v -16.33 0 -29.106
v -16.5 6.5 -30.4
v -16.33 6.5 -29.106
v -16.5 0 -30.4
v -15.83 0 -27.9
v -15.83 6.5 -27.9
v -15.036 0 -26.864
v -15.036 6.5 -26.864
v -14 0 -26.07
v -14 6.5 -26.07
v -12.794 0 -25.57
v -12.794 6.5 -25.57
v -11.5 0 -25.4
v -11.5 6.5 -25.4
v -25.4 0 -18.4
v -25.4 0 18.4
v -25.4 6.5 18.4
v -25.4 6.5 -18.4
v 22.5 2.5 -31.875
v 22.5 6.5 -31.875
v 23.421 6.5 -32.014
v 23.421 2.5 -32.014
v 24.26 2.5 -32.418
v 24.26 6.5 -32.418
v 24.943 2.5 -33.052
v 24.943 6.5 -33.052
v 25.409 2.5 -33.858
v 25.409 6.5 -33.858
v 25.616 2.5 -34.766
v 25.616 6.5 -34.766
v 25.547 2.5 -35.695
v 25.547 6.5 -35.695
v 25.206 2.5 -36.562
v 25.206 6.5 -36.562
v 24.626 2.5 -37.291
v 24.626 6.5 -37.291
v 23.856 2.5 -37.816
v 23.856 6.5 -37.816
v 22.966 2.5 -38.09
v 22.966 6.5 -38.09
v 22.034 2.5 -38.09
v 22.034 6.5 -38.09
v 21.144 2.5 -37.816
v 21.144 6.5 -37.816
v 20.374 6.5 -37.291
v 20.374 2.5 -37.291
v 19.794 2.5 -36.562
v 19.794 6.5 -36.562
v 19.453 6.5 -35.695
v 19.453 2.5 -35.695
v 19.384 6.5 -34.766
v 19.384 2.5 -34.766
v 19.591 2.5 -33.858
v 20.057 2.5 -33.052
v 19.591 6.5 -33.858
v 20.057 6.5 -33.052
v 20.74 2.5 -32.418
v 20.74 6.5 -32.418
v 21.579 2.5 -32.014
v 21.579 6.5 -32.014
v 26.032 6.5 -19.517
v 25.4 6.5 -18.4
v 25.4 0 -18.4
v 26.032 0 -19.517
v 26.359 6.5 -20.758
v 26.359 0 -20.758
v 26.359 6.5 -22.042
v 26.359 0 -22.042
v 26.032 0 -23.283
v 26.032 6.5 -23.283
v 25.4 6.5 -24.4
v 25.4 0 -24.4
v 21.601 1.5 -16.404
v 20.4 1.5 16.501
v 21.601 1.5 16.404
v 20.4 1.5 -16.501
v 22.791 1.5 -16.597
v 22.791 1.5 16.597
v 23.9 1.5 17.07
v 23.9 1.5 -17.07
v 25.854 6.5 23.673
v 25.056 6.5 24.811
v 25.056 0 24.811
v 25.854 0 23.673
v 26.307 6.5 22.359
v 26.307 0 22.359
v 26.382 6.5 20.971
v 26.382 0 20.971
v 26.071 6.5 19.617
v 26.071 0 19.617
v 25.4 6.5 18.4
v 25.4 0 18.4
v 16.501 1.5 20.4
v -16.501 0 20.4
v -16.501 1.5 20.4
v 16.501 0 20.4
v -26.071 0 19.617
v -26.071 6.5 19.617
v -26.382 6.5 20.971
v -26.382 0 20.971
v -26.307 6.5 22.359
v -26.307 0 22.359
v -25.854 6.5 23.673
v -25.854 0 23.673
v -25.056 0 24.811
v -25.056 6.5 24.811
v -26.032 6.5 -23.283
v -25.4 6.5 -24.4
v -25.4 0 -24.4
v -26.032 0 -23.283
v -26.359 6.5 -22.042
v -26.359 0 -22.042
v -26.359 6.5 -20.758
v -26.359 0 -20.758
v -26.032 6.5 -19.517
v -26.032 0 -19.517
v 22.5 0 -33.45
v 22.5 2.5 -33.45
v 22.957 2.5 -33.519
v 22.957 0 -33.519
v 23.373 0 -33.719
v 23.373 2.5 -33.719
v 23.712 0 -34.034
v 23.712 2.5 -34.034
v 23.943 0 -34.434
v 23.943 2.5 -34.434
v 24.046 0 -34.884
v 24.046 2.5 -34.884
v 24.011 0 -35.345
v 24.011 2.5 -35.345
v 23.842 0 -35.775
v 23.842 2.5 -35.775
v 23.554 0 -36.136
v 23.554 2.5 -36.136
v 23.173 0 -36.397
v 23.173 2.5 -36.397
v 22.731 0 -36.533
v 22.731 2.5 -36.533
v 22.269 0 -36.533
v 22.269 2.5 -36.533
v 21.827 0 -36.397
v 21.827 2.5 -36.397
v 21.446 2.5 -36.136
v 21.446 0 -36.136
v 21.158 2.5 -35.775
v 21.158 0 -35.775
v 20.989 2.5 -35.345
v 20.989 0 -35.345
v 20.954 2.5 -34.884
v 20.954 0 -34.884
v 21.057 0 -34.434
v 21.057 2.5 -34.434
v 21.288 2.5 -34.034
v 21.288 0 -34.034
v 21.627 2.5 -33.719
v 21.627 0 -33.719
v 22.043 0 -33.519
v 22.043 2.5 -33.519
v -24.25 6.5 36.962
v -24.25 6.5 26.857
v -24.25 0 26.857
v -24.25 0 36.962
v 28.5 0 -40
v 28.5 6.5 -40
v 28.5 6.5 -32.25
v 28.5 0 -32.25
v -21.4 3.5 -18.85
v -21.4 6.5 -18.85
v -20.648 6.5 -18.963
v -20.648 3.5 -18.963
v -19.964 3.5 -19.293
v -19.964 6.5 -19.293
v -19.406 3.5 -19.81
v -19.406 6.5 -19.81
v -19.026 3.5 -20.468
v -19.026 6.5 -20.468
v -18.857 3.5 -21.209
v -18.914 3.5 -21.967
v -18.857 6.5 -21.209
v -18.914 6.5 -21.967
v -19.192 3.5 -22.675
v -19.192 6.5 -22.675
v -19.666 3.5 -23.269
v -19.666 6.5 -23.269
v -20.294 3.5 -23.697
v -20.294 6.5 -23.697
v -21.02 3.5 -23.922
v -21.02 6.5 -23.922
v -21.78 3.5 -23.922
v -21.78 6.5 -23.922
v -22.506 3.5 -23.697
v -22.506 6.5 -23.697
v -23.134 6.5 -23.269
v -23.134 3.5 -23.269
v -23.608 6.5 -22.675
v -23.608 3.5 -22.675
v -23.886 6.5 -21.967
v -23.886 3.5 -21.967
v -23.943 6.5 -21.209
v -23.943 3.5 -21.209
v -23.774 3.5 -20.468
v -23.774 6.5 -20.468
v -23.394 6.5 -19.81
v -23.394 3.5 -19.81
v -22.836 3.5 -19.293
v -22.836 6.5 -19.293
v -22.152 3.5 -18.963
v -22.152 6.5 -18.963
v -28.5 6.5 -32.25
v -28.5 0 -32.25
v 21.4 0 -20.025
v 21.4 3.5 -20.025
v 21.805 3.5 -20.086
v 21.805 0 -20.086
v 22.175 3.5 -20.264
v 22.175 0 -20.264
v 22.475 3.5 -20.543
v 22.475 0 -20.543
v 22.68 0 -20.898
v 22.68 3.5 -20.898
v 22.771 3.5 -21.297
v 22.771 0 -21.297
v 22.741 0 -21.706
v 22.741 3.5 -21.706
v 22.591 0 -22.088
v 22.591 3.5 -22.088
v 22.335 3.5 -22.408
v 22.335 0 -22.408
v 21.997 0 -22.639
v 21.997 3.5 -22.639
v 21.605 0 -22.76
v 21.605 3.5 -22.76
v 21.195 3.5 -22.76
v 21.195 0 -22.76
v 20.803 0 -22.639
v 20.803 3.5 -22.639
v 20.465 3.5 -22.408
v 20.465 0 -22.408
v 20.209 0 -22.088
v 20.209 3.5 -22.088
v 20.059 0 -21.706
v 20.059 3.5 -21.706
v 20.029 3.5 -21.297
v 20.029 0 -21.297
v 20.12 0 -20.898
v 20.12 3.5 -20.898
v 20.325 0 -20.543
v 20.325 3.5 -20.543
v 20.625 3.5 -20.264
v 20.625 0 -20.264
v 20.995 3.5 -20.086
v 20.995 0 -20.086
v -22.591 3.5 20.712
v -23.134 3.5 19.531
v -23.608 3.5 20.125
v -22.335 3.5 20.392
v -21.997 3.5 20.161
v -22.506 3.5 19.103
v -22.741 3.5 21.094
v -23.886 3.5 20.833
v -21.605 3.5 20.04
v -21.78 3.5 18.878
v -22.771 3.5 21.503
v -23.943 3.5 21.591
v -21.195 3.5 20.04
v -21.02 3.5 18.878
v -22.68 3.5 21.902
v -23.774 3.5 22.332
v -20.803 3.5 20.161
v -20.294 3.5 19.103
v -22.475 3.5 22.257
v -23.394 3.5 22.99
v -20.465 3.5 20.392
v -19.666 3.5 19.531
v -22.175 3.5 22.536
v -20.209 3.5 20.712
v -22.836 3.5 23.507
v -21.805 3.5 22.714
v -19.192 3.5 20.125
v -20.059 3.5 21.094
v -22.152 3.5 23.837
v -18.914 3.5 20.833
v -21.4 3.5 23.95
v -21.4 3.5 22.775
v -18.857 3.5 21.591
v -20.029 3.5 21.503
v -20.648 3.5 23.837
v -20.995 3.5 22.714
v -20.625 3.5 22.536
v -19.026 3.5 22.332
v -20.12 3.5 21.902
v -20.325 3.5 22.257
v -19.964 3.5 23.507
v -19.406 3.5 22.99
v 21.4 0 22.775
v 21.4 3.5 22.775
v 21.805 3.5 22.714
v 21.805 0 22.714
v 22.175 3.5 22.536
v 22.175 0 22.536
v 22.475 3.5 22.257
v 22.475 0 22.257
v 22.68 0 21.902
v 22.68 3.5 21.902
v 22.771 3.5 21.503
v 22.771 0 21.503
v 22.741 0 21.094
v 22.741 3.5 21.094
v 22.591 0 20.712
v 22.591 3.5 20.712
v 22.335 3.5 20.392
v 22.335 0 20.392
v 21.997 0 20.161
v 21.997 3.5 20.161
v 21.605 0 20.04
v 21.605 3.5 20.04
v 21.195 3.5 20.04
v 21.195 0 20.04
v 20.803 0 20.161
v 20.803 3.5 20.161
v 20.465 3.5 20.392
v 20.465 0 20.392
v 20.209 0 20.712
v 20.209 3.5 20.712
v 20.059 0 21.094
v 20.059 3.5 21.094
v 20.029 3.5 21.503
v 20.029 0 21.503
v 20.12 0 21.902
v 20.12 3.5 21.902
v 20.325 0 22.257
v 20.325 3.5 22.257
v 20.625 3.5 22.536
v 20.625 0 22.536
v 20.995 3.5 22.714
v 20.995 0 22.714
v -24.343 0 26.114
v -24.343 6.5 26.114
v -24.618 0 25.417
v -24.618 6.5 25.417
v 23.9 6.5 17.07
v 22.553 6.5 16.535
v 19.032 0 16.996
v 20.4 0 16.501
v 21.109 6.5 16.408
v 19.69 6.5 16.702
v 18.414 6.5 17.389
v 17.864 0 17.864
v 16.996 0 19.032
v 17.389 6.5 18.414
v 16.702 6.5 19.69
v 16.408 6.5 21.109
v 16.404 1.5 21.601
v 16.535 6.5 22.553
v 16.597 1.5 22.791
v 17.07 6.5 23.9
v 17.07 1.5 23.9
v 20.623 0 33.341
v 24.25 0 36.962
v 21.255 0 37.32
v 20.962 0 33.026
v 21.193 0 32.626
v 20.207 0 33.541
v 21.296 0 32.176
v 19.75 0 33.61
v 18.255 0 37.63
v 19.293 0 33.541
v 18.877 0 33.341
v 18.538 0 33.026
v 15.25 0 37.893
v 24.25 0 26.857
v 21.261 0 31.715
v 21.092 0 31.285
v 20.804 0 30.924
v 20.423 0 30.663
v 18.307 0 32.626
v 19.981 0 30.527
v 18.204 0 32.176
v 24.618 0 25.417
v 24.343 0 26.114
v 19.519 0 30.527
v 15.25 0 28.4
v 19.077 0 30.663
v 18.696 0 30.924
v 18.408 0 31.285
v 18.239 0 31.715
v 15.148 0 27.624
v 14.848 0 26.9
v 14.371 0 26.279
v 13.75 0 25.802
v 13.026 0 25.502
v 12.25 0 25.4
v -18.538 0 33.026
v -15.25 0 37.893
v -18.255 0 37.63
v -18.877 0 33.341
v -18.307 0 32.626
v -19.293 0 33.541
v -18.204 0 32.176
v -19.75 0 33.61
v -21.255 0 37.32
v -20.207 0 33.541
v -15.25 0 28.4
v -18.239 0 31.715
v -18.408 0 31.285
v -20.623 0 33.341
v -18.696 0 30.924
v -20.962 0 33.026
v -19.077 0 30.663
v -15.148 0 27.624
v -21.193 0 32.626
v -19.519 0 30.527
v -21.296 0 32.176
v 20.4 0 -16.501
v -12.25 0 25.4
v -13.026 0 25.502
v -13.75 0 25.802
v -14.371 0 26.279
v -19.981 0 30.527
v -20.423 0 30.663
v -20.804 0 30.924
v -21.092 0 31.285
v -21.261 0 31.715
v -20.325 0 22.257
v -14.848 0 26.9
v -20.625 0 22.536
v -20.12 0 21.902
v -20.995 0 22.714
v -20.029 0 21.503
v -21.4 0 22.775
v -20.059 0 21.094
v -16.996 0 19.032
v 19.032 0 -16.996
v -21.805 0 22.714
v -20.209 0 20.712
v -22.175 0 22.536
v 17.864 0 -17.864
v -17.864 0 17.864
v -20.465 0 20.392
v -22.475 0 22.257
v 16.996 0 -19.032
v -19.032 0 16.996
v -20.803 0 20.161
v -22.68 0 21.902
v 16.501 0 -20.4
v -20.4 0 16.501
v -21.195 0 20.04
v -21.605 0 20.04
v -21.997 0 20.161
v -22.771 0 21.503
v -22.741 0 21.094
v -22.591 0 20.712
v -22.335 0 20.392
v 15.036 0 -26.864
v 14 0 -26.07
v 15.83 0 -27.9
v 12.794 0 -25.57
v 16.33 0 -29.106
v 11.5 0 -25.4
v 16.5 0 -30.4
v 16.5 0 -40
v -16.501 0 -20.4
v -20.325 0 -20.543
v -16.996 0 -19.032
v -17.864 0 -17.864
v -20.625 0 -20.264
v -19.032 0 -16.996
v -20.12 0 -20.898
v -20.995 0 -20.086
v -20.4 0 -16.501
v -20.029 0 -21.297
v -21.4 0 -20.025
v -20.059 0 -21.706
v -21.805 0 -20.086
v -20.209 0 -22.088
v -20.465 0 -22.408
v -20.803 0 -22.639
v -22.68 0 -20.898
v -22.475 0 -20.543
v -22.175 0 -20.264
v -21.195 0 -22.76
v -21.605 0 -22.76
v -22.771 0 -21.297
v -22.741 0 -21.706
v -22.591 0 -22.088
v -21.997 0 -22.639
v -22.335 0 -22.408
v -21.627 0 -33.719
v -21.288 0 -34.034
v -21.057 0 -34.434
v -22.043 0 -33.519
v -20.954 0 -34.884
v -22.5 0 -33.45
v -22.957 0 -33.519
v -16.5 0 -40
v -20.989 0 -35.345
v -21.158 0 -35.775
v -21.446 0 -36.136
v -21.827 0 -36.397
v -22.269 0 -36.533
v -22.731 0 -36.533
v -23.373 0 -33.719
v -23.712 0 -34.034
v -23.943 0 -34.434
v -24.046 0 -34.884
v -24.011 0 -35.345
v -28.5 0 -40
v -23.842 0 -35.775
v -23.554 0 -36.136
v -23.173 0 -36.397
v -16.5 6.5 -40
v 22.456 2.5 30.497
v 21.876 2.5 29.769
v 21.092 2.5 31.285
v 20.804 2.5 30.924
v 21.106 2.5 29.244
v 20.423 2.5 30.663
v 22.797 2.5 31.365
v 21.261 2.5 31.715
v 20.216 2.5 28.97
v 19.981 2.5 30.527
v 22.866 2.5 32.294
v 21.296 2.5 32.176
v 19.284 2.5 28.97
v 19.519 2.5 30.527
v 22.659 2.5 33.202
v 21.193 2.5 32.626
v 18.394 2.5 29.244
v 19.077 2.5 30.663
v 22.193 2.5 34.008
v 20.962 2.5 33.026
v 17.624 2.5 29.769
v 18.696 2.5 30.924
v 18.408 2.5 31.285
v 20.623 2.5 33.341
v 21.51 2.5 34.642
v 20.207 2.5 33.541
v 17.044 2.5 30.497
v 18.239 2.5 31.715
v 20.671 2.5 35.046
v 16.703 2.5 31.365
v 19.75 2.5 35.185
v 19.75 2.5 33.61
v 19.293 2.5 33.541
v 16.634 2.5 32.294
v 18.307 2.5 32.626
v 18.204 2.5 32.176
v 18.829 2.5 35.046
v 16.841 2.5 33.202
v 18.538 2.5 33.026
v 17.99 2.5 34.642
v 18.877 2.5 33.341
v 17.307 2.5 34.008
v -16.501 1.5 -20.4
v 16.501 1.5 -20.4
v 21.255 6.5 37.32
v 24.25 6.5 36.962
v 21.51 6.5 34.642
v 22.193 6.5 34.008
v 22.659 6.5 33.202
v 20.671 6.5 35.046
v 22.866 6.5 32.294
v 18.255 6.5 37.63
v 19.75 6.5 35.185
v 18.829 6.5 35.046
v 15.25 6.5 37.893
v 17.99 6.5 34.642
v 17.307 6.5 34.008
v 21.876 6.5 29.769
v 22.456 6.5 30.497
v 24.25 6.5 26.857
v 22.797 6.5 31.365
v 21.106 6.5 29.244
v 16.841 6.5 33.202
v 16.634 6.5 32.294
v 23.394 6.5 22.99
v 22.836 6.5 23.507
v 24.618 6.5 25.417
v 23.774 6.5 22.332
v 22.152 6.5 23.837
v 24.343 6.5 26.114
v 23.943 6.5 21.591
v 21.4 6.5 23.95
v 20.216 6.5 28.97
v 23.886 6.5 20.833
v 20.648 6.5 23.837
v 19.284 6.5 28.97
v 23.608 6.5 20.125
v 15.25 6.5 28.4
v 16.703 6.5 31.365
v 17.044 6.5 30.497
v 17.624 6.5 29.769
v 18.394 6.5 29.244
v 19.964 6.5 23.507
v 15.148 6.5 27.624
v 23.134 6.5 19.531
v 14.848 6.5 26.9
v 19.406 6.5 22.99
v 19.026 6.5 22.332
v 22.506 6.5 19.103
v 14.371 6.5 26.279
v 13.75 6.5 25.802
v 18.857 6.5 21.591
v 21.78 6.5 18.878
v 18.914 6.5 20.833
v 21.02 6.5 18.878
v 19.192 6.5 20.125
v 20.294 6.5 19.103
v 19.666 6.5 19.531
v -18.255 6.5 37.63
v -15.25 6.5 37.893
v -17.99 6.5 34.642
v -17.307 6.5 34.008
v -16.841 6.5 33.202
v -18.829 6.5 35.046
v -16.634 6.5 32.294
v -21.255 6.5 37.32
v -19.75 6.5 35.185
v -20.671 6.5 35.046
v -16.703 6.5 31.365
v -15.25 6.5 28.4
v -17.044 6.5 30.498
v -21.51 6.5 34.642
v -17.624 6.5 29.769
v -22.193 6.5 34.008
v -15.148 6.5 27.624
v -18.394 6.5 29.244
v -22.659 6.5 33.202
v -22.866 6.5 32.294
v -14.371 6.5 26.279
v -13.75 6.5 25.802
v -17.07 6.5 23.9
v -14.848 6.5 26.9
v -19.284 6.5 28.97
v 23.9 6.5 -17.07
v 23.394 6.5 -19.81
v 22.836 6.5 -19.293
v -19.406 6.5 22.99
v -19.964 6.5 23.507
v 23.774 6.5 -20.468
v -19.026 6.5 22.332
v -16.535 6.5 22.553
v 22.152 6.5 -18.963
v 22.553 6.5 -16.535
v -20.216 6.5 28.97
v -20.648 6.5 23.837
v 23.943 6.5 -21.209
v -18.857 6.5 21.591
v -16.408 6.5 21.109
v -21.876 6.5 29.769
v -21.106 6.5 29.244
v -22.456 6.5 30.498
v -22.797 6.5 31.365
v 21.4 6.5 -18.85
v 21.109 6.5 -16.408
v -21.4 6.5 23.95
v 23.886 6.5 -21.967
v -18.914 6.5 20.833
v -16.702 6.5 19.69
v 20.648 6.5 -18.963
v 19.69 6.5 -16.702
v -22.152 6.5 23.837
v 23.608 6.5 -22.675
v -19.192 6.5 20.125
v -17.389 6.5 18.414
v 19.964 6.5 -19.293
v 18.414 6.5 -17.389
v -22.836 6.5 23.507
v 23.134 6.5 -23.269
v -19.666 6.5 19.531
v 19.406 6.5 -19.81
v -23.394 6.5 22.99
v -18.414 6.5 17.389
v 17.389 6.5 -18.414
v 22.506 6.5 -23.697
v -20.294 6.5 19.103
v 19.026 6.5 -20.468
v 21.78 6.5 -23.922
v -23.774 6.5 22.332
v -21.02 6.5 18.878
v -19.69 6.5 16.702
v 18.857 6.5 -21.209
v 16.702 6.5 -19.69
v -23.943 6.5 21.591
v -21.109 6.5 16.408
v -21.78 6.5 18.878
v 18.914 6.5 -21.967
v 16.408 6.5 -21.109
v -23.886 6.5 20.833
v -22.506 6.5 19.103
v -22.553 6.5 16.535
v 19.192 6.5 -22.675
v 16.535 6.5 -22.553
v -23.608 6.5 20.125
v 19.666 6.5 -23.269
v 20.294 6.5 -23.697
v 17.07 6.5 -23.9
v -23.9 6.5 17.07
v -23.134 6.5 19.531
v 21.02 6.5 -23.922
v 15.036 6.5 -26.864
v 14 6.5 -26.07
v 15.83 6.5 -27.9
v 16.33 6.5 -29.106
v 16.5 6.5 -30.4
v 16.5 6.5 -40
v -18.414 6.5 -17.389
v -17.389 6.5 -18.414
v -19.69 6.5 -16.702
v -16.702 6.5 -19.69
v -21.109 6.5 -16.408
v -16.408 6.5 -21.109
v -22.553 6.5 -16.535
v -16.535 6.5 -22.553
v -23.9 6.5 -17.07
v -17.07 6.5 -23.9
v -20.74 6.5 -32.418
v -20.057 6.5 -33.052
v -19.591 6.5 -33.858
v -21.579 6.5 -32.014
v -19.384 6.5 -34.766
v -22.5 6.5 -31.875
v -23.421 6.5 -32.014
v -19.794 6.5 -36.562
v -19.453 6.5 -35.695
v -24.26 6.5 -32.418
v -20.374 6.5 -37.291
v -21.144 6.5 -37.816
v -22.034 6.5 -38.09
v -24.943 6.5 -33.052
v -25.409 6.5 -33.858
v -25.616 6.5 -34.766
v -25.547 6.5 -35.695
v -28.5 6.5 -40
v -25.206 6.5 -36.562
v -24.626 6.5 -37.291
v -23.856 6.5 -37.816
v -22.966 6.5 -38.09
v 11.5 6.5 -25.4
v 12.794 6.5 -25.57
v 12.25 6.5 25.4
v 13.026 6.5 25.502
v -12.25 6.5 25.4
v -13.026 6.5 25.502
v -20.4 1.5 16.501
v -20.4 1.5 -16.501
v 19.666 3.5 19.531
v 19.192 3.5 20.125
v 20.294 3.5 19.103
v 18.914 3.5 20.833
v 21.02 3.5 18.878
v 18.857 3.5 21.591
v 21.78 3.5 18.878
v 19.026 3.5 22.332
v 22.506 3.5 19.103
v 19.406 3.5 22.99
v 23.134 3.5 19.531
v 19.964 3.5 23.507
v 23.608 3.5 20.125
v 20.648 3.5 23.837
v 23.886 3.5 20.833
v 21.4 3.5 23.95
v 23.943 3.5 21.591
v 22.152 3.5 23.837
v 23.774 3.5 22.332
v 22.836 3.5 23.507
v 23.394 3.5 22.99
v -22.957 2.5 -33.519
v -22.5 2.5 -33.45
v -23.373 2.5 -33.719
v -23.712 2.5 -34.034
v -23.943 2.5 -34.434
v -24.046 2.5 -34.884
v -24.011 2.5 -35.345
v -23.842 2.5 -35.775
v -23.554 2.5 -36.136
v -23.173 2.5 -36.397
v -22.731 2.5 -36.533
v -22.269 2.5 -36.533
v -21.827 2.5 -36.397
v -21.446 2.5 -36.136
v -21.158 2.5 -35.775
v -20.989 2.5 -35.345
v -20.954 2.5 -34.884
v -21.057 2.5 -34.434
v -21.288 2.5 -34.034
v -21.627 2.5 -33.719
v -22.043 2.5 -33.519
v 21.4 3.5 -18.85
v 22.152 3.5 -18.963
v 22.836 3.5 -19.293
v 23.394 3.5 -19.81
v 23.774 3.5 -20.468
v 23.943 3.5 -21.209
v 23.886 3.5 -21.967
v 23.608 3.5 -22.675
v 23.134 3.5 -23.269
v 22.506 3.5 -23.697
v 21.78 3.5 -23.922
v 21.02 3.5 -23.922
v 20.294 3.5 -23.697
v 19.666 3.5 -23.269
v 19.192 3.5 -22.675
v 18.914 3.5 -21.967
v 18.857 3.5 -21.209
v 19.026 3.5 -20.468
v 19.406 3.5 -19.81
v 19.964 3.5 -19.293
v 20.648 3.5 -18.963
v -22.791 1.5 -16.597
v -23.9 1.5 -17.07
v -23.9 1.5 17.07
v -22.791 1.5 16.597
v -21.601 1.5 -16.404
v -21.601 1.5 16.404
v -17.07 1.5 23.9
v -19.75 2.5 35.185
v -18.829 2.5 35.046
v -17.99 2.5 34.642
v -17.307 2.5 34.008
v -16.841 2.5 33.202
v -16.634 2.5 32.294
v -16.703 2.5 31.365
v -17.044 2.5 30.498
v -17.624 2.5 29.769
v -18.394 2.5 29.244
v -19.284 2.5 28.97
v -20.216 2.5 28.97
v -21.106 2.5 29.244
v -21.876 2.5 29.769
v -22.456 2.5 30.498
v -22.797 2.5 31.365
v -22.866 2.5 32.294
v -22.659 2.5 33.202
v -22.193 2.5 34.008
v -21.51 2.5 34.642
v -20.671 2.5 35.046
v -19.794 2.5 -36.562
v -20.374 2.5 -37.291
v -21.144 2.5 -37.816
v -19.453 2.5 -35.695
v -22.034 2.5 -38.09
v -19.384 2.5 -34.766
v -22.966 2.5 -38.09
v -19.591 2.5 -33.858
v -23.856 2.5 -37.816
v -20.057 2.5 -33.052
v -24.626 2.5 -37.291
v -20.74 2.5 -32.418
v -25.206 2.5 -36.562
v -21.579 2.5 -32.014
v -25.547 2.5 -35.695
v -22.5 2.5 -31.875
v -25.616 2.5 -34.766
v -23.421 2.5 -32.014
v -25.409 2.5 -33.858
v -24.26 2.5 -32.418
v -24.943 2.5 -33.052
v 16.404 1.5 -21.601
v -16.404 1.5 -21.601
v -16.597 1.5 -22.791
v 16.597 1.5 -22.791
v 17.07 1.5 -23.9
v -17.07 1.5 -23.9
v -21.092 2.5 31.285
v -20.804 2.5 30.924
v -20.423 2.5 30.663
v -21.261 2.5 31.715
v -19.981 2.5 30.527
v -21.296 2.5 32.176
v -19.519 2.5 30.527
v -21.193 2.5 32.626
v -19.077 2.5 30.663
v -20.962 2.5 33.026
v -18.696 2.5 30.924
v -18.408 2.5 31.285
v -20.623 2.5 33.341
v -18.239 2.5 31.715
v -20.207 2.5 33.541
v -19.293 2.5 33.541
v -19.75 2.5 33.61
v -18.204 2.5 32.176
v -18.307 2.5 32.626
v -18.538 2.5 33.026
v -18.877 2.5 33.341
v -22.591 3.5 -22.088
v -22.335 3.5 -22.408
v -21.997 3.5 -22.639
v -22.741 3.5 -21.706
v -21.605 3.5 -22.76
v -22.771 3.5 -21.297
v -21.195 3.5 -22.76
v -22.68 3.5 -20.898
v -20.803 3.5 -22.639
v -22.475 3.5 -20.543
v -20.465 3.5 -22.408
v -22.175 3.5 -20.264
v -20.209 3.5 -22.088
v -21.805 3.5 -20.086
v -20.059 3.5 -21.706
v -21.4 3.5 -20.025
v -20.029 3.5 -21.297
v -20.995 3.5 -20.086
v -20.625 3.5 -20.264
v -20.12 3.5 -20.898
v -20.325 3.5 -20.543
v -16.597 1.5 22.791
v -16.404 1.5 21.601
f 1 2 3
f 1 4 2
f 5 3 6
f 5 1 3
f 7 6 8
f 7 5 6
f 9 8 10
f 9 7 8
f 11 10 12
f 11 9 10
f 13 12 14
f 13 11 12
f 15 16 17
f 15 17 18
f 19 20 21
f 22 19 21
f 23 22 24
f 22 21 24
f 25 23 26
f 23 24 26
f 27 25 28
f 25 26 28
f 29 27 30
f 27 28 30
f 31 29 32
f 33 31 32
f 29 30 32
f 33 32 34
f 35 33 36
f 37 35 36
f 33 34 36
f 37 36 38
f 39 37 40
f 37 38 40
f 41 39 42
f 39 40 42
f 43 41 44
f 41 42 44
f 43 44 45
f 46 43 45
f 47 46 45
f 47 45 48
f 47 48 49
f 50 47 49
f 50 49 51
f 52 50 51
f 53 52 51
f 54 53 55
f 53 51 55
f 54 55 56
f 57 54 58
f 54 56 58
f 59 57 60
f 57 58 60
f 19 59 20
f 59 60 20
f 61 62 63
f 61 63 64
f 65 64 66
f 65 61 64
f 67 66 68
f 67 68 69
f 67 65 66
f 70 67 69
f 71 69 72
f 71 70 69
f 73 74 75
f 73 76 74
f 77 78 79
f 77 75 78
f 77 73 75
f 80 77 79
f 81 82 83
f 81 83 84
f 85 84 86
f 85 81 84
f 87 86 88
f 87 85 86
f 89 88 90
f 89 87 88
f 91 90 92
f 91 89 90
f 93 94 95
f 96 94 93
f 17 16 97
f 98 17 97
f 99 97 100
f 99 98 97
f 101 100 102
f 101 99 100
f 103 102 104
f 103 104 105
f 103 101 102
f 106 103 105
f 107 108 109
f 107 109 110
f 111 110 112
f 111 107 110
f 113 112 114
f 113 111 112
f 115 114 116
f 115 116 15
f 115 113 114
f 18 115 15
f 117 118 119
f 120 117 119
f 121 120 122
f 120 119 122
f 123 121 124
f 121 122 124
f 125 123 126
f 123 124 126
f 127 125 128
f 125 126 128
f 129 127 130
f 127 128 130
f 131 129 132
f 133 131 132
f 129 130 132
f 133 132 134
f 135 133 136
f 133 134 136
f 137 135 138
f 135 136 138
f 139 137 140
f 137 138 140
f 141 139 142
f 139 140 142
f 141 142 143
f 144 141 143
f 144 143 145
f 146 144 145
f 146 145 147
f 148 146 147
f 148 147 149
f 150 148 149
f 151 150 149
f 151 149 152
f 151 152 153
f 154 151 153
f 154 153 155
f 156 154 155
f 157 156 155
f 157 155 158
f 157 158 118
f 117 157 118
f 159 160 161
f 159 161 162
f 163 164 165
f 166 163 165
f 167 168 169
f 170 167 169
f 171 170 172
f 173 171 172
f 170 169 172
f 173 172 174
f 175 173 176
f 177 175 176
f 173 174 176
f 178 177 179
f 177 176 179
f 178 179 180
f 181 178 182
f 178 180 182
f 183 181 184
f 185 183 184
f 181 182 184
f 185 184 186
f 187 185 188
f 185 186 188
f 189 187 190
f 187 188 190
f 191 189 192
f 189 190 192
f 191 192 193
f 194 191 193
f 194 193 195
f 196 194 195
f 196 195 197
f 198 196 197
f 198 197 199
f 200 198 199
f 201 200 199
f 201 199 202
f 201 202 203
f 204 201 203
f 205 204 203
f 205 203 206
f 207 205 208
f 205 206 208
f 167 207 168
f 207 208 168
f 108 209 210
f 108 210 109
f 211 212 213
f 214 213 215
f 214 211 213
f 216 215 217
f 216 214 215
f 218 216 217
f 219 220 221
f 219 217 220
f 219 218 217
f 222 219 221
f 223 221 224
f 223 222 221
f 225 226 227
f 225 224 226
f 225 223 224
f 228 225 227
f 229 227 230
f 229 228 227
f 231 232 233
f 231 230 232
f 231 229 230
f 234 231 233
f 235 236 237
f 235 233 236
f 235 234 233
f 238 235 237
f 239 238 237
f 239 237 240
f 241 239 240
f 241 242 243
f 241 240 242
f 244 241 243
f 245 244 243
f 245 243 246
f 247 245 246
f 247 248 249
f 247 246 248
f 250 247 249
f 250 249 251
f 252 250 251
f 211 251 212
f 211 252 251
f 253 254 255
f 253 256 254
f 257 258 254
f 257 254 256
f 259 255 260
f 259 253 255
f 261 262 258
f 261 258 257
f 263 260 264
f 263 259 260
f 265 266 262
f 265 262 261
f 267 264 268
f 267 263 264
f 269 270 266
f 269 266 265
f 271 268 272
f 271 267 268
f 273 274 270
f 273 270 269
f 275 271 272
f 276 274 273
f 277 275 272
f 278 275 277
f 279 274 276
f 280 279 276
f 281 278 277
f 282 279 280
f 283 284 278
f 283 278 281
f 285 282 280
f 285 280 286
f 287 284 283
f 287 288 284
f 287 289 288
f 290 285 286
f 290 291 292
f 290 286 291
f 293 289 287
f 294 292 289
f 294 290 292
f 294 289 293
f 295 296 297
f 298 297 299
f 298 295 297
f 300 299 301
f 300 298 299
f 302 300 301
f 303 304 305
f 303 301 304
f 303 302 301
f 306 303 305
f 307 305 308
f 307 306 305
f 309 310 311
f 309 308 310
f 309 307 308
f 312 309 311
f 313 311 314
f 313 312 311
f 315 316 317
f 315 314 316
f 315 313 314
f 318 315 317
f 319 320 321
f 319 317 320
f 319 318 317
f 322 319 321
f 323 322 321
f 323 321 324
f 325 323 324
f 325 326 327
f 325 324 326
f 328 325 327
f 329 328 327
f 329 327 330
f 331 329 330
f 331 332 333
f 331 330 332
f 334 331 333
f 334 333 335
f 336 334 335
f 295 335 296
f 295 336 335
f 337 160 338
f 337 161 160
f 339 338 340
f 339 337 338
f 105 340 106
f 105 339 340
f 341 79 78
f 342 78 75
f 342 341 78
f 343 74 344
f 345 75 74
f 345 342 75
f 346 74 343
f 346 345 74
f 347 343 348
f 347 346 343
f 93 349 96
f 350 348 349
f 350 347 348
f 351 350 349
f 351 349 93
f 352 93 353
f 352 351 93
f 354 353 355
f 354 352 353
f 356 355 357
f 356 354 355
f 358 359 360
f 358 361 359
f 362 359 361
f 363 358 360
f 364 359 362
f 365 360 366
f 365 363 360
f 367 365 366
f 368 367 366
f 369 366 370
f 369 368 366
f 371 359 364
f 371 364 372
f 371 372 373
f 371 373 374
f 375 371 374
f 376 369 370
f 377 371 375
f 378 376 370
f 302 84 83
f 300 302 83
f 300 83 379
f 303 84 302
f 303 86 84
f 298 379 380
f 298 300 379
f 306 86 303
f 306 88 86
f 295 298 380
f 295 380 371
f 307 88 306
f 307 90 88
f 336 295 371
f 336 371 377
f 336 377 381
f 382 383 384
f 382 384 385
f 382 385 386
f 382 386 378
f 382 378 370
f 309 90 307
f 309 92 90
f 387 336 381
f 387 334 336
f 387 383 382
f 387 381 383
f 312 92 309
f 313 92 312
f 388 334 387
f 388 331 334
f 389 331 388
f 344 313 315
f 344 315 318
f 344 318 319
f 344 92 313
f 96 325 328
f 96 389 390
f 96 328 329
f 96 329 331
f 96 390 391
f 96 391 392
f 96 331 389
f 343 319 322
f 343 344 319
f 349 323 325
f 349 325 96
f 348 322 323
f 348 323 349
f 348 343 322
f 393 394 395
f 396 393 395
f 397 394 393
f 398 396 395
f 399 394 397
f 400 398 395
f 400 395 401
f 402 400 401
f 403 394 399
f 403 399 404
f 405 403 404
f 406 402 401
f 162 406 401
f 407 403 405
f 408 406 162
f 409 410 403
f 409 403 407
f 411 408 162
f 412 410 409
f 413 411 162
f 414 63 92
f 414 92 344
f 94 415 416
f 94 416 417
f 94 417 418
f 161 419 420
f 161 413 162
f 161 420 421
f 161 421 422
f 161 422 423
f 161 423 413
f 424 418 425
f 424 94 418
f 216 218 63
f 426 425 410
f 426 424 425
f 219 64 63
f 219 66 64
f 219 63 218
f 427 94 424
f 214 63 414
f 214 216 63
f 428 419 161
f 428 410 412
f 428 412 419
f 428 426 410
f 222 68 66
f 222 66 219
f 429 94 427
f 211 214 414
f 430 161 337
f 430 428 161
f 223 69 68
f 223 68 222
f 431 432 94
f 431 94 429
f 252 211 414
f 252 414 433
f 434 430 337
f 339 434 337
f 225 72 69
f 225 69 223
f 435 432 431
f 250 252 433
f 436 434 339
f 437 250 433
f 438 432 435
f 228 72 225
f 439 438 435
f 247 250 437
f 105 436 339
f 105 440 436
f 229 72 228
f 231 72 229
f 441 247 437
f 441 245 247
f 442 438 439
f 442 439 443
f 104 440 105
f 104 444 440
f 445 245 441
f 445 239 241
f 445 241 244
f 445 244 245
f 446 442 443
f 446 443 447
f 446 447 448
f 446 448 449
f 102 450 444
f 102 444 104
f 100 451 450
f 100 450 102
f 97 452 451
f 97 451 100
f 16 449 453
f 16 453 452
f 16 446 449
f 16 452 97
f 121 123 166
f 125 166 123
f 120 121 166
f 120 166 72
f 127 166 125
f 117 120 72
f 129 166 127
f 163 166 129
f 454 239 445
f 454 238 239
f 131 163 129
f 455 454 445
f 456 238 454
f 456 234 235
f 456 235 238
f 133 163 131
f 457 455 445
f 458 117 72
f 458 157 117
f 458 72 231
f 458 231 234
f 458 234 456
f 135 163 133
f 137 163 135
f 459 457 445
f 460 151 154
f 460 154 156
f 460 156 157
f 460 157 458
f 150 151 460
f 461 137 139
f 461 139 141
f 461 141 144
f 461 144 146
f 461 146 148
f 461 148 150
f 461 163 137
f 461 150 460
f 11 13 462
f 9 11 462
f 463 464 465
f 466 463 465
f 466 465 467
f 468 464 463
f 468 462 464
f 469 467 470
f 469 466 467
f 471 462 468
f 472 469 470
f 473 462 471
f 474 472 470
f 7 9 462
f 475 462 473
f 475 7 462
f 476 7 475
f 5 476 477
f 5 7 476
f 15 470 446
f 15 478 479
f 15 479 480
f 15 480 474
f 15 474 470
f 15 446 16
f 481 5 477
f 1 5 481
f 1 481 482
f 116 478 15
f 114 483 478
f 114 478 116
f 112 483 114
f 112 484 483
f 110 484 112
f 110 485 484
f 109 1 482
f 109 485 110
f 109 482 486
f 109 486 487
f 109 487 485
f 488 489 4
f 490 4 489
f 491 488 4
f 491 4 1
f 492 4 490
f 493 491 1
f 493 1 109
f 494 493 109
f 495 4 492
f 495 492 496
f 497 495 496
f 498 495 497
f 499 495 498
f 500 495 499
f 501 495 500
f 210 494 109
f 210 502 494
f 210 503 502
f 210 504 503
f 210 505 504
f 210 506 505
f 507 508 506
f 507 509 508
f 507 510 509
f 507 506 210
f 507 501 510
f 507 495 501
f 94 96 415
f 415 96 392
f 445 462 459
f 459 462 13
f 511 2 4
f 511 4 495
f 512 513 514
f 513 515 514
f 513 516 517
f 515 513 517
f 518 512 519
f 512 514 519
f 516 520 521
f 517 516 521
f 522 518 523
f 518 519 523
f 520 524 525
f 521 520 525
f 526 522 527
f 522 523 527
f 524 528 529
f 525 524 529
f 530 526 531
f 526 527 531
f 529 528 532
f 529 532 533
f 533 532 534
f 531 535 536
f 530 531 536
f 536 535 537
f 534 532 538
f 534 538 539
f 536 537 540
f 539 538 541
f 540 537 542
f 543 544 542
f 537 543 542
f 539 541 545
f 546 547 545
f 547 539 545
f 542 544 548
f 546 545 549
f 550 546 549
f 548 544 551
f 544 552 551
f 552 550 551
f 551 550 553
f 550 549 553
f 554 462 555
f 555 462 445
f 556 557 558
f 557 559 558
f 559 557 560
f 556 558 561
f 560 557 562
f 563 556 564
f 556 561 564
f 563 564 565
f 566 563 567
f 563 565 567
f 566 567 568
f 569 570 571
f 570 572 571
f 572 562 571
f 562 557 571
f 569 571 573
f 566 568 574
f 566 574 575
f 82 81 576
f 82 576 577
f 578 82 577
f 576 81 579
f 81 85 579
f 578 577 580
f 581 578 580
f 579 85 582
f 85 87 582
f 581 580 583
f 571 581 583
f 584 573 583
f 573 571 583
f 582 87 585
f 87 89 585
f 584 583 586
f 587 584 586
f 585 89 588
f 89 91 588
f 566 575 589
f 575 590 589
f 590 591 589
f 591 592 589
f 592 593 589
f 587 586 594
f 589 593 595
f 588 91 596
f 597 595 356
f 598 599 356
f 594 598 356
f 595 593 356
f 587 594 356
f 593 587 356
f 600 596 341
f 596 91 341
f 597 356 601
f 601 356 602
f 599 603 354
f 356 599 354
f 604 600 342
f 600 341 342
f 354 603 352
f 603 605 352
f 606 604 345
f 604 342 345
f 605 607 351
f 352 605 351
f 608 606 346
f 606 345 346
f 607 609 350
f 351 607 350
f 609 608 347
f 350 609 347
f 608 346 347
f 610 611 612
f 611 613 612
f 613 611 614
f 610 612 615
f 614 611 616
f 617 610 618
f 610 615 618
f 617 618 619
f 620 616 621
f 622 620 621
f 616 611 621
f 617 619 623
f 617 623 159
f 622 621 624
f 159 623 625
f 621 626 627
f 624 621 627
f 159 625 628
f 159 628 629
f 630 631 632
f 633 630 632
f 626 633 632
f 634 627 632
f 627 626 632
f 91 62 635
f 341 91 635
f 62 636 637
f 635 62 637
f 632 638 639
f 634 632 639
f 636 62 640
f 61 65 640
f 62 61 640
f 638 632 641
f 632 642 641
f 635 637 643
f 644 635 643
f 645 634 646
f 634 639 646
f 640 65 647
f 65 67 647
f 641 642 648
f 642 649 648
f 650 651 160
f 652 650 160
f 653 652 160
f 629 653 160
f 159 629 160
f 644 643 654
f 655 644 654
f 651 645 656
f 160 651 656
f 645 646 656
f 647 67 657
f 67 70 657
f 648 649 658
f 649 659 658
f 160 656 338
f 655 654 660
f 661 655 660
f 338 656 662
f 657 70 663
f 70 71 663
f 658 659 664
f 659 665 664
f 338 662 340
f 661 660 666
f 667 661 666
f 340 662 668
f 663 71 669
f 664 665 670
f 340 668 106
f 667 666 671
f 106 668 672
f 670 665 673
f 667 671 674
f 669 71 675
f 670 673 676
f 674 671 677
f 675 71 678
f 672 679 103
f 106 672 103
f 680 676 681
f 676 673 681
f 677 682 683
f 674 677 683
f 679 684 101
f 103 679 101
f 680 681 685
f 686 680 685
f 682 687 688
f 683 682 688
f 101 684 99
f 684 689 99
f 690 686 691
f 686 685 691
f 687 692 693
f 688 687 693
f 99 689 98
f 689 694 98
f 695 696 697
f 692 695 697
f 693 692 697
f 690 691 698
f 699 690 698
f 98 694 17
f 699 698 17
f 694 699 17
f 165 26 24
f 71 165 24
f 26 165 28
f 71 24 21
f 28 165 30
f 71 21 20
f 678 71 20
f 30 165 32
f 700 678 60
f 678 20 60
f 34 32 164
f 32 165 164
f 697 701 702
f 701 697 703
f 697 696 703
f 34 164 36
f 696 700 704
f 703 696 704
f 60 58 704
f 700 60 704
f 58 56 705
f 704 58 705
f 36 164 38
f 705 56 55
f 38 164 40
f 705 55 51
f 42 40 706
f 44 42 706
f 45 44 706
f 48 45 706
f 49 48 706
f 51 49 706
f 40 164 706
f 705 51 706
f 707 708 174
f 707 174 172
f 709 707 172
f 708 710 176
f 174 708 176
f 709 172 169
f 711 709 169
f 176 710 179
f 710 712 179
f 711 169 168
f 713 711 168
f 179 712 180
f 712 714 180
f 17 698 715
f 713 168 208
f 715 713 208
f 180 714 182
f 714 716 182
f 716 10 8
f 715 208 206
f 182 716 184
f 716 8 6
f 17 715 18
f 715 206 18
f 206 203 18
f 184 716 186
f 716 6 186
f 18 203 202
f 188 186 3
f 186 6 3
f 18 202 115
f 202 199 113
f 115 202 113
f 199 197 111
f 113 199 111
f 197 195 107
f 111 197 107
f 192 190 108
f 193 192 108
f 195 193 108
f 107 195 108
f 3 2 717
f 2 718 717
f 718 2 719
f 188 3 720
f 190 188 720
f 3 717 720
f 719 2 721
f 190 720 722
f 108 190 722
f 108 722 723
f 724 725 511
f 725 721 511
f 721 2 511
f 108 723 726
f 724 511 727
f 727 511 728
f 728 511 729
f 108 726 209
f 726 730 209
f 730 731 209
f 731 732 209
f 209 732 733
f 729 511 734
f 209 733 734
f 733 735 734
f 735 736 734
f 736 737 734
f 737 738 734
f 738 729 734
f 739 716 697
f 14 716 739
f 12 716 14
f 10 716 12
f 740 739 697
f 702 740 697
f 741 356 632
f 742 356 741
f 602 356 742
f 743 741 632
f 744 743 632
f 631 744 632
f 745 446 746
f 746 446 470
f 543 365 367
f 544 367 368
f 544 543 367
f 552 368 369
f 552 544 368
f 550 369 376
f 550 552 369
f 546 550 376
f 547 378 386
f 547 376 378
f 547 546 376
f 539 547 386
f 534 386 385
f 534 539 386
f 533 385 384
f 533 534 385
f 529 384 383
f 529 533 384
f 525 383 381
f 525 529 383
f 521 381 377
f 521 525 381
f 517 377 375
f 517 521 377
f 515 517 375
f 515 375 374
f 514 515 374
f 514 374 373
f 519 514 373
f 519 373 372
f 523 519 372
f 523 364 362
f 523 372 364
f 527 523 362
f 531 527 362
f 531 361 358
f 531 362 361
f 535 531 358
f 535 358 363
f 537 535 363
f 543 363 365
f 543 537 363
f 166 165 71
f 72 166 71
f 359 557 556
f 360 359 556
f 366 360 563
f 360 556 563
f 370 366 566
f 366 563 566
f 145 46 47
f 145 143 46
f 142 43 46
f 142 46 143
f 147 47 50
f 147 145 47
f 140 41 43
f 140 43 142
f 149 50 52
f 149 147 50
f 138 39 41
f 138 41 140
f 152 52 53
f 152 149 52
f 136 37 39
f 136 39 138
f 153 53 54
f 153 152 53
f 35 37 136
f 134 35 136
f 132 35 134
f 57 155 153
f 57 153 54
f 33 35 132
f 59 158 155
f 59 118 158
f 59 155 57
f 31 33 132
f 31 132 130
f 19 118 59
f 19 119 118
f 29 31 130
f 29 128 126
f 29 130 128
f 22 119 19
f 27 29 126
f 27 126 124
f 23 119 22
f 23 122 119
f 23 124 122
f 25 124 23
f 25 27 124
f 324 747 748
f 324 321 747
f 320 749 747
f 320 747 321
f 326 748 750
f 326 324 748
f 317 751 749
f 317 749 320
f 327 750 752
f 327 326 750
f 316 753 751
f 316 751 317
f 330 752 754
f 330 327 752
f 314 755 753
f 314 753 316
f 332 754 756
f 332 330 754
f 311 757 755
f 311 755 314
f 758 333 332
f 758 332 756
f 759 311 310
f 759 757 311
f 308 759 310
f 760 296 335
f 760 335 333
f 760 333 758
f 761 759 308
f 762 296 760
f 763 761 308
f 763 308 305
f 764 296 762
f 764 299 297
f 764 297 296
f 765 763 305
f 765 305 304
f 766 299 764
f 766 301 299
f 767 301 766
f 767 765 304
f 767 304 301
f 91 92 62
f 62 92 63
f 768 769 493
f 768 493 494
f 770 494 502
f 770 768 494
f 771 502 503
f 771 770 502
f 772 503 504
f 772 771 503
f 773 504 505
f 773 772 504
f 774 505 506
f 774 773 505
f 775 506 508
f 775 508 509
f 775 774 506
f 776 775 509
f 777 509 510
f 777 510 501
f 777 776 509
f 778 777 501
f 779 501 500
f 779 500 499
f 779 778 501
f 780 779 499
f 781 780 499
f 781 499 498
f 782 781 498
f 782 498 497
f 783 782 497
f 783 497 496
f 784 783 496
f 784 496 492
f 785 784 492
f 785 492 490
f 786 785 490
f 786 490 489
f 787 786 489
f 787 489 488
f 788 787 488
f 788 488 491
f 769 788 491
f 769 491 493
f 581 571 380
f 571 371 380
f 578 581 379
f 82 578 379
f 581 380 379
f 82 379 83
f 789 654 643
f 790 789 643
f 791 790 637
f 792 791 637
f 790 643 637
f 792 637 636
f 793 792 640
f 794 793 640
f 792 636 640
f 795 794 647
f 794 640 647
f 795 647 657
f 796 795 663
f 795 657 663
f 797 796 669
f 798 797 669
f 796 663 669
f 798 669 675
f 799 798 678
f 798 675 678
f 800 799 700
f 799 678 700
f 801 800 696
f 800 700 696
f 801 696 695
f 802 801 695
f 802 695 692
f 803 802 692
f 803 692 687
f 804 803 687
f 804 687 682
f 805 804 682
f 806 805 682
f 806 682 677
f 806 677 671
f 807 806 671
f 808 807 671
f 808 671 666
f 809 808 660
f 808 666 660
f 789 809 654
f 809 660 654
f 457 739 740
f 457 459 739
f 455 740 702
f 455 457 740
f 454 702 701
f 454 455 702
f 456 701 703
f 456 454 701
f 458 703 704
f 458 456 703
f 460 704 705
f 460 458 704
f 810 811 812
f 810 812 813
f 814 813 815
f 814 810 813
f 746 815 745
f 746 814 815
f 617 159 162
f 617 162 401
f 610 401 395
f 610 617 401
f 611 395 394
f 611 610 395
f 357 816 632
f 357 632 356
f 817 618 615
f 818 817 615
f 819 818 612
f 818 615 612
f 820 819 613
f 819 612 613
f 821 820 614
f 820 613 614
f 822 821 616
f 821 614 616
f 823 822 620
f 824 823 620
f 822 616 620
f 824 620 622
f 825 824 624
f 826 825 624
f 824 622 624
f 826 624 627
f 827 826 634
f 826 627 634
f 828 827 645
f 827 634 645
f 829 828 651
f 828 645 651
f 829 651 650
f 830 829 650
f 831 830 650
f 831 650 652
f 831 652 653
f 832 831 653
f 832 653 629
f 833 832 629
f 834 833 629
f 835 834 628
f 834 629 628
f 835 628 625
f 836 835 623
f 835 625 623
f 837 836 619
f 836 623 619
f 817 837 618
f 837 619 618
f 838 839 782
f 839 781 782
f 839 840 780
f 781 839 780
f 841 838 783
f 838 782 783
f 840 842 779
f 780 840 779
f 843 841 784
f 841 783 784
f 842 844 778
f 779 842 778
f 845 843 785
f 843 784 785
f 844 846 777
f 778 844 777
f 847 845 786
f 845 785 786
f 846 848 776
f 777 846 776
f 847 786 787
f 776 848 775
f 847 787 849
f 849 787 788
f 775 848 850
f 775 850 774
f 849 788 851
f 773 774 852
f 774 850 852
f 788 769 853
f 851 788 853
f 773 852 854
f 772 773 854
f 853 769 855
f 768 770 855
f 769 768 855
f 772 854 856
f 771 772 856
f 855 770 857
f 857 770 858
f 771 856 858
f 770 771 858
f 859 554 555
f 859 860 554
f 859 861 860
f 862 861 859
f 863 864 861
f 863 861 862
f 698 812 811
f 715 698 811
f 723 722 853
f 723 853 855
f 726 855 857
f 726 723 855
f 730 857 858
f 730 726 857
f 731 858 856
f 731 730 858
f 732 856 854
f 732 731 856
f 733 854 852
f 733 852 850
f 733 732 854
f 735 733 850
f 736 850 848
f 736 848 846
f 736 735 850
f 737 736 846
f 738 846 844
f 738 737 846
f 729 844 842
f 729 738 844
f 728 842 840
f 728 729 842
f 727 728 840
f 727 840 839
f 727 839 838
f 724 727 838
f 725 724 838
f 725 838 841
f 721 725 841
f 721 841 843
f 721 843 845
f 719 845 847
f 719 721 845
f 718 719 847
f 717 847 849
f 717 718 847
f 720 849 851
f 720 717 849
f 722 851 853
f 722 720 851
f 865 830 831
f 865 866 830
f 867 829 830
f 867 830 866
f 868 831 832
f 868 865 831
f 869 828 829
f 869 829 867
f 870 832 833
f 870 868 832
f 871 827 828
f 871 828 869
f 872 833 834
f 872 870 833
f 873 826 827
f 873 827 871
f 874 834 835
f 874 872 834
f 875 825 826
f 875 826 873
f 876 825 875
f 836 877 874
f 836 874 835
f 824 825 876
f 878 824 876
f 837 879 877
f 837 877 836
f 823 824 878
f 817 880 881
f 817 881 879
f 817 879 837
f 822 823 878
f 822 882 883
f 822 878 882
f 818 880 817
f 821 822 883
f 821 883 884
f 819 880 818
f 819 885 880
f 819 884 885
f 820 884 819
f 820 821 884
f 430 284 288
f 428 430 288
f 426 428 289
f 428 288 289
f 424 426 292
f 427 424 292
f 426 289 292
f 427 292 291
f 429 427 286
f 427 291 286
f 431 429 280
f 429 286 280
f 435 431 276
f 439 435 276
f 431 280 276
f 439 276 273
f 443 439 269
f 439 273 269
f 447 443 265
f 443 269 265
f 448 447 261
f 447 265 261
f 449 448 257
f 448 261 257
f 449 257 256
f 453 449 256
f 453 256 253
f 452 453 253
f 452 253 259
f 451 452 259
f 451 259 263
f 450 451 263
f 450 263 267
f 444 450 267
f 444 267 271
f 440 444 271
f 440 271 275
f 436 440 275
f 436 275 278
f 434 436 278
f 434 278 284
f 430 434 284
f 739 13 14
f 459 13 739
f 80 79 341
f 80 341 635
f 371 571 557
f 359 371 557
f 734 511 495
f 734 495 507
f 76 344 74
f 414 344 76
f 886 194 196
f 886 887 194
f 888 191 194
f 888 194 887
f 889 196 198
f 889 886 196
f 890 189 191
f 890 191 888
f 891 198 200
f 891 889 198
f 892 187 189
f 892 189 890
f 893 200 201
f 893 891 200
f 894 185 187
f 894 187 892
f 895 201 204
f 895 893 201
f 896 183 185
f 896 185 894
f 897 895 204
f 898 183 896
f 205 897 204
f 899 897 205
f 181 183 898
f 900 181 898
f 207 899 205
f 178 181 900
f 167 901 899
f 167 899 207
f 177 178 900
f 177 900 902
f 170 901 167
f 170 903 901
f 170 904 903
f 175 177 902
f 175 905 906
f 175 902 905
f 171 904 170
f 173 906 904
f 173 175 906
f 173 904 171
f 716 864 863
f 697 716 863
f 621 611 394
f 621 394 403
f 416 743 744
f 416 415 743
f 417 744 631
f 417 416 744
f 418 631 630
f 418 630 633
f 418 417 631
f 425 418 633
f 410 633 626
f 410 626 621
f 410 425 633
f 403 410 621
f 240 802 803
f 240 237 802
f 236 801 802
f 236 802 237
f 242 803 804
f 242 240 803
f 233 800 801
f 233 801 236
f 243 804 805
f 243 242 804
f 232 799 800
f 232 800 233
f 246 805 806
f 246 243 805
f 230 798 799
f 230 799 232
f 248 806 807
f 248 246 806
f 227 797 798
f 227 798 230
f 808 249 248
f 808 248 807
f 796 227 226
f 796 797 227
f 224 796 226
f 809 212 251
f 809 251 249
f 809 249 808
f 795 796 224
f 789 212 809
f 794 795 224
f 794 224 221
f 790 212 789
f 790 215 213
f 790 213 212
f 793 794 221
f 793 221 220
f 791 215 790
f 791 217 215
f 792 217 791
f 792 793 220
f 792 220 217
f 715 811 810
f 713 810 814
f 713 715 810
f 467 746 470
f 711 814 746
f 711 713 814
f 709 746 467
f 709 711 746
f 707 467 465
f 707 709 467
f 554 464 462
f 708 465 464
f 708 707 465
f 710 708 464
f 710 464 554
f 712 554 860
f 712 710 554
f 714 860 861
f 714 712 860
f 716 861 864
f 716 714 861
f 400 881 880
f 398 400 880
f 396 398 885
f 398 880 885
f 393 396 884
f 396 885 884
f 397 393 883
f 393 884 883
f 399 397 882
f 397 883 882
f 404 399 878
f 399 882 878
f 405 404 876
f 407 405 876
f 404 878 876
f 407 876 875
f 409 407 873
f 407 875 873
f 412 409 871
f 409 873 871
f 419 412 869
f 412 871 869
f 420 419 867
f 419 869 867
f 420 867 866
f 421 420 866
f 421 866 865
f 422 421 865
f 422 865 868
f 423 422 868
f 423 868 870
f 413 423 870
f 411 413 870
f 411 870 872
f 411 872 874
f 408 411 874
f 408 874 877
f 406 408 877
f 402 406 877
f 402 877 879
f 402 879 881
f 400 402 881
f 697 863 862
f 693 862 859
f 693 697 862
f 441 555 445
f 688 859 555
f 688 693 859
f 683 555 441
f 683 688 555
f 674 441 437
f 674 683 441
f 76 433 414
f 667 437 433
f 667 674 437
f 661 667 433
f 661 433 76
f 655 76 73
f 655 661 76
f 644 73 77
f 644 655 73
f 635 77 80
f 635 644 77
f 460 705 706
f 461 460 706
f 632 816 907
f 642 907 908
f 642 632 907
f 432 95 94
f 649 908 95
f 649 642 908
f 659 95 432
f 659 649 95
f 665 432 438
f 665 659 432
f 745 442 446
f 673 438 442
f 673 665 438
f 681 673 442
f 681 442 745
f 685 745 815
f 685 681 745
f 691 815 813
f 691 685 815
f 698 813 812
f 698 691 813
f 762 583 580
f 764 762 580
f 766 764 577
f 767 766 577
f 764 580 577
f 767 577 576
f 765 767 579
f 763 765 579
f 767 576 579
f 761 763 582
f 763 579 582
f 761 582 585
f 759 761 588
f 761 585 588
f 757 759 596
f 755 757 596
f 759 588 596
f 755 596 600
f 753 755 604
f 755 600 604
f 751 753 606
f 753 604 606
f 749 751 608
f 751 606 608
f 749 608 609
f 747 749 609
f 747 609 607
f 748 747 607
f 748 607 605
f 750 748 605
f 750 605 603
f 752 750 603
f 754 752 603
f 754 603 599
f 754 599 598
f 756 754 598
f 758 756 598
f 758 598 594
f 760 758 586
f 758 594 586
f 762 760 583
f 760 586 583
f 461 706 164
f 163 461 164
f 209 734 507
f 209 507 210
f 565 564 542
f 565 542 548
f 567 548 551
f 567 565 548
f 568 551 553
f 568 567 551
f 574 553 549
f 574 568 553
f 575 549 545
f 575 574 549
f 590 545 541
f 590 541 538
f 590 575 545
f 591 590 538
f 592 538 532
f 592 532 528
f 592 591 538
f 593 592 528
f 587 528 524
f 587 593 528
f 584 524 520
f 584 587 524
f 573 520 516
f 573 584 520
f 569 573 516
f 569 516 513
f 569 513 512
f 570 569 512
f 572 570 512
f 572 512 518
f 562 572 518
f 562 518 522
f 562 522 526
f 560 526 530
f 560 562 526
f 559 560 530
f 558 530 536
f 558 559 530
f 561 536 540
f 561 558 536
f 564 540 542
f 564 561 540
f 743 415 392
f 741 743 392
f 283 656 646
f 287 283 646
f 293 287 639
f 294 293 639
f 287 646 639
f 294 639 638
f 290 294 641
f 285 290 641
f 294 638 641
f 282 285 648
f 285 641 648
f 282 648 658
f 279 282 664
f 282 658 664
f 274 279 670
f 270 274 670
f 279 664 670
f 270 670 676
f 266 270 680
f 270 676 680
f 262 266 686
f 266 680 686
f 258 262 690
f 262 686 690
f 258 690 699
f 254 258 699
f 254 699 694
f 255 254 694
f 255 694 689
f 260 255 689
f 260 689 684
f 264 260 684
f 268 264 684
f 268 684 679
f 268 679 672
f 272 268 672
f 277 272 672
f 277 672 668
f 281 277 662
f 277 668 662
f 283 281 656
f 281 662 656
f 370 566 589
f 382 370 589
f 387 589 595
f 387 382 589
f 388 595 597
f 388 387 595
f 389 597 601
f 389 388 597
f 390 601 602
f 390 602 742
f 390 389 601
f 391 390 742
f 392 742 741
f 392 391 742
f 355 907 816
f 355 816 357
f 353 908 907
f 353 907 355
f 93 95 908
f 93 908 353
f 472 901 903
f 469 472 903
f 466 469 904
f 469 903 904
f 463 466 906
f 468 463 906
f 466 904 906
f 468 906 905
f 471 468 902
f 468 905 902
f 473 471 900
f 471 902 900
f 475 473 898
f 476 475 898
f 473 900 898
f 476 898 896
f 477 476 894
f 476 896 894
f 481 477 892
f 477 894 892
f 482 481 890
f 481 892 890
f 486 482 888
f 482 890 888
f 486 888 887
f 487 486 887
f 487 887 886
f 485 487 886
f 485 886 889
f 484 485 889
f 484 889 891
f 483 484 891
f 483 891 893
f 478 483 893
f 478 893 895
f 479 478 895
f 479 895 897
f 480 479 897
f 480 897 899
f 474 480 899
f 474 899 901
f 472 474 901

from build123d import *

# Parameters (mm, degrees)
SKETCH1_W           = 50.8
SKETCH1_H           = 50.8
SKETCH1_R           = 1.375
SKETCH1_W_2         = 40.8
SKETCH1_H_2         = 40.8
BOSS_EXTRUDE1_DEPTH = 1.5
SKETCH2_W           = 50.8
SKETCH2_H           = 50.8
SKETCH2_W_2         = 47.8
SKETCH2_H_2         = 47.8
BOSS_EXTRUDE2_DEPTH = 5
FILLET2_R           = 3
BOSS_EXTRUDE3_REACH = 38.504
SKETCH5_R           = 5
SKETCH5_R_2         = 1.375
SKETCH6_R           = 2.55
CUT_EXTRUDE1_DEPTH  = 3
SKETCH7_R           = 1.55
BOSS_EXTRUDE4_DEPTH = 6.5
SKETCH8_R           = 3.125
CUT_EXTRUDE2_DEPTH  = 4
FILLET3_R           = 5
BOSS_EXTRUDE5_DEPTH = 6.5
SKETCH10_R          = 3.125
CUT_EXTRUDE3_DEPTH  = 4
SKETCH11_R          = 1.55
CUT_EXTRUDE4_DEPTH  = 50.27727671
FILLET4_R           = 3


with BuildPart() as part:
    # Sketch1 → Boss-Extrude1 (new body)
    with BuildSketch(Plane(origin=(0, 0, 0), x_dir=(1, 0, 0), z_dir=(0, 1, 0))):
        Rectangle(SKETCH1_W, SKETCH1_H)
        with Locations(Location((-21.4, 21.4, 0), (0, 0, 270))):
            Circle(SKETCH1_R, mode=Mode.SUBTRACT)
        with Locations(Location((21.4, 21.4, 0), (0, 0, 270))):
            Circle(SKETCH1_R, mode=Mode.SUBTRACT)
        with Locations(Location((21.4, -21.4, 0), (0, 0, 270))):
            Circle(SKETCH1_R, mode=Mode.SUBTRACT)
        with Locations(Location((-21.4, -21.4, 0), (0, 0, 270))):
            Circle(SKETCH1_R, mode=Mode.SUBTRACT)
        Rectangle(SKETCH1_W_2, SKETCH1_H_2, mode=Mode.SUBTRACT)
    extrude(amount=BOSS_EXTRUDE1_DEPTH)

    # Sketch2 → Boss-Extrude2 (add)
    with BuildSketch(Plane(origin=(0, 1.5, 0), x_dir=(1, 0, 0), z_dir=(0, 1, 0))):
        Rectangle(SKETCH2_W, SKETCH2_H)
        Rectangle(SKETCH2_W_2, SKETCH2_H_2, mode=Mode.SUBTRACT)
    extrude(amount=BOSS_EXTRUDE2_DEPTH)

    # Fillet2
    fillet2_edges = [part.edges().sort_by_distance(p)[0] for p in [
        (23.9, 4, -23.9),
        (-23.9, 4, -23.9),
        (-23.9, 4, 23.9),
        (23.9, 4, 23.9),
        (25.4, 3.25, 25.4),
        (-25.4, 3.25, 25.4),
        (-25.4, 3.25, -25.4),
        (25.4, 3.25, -25.4),
    ]]
    fillet(fillet2_edges, radius=FILLET2_R)

    # Boss-Extrude3: up to this face of the body (flat: up to its plane)
    boss_extrude3_end = Plane(part.part.faces().sort_by_distance((0, 0, -24.68157951))[0])
    # Sketch5 → Boss-Extrude3 (add, up to the picked face)
    with BuildSketch(Plane(origin=(0, 6.5, 0), x_dir=(1, 0, 0), z_dir=(0, 1, 0)), mode=Mode.PRIVATE) as boss_extrude3_sk1:
        with Locations((-21.4, 21.4)):
            Circle(SKETCH5_R)
        with Locations(Location((-21.4, 21.4, 0), (0, 0, 270))):
            Circle(SKETCH5_R_2, mode=Mode.SUBTRACT)
    boss_extrude3_tool1 = split(extrude(boss_extrude3_sk1.sketch, amount=-BOSS_EXTRUDE3_REACH, mode=Mode.PRIVATE), bisect_by=boss_extrude3_end, keep=Keep.BOTH, mode=Mode.PRIVATE)
    # Sketch5 → Boss-Extrude3 (add, up to the picked face)
    with BuildSketch(Plane(origin=(0, 6.5, 0), x_dir=(1, 0, 0), z_dir=(0, 1, 0)), mode=Mode.PRIVATE) as boss_extrude3_sk2:
        with Locations((21.4, 21.4)):
            Circle(SKETCH5_R)
        with Locations(Location((21.4, 21.4, 0), (0, 0, 270))):
            Circle(SKETCH5_R_2, mode=Mode.SUBTRACT)
    boss_extrude3_tool2 = split(extrude(boss_extrude3_sk2.sketch, amount=-BOSS_EXTRUDE3_REACH, mode=Mode.PRIVATE), bisect_by=boss_extrude3_end, keep=Keep.BOTH, mode=Mode.PRIVATE)
    # Sketch5 → Boss-Extrude3 (add, up to the picked face)
    with BuildSketch(Plane(origin=(0, 6.5, 0), x_dir=(1, 0, 0), z_dir=(0, 1, 0)), mode=Mode.PRIVATE) as boss_extrude3_sk3:
        with Locations((21.4, -21.4)):
            Circle(SKETCH5_R)
        with Locations(Location((21.4, -21.4, 0), (0, 0, 270))):
            Circle(SKETCH5_R_2, mode=Mode.SUBTRACT)
    boss_extrude3_tool3 = split(extrude(boss_extrude3_sk3.sketch, amount=-BOSS_EXTRUDE3_REACH, mode=Mode.PRIVATE), bisect_by=boss_extrude3_end, keep=Keep.BOTH, mode=Mode.PRIVATE)
    # Sketch5 → Boss-Extrude3 (add, up to the picked face)
    with BuildSketch(Plane(origin=(0, 6.5, 0), x_dir=(1, 0, 0), z_dir=(0, 1, 0)), mode=Mode.PRIVATE) as boss_extrude3_sk4:
        with Locations((-21.4, -21.4)):
            Circle(SKETCH5_R)
        with Locations(Location((-21.4, -21.4, 0), (0, 0, 270))):
            Circle(SKETCH5_R_2, mode=Mode.SUBTRACT)
    boss_extrude3_tool4 = split(extrude(boss_extrude3_sk4.sketch, amount=-BOSS_EXTRUDE3_REACH, mode=Mode.PRIVATE), bisect_by=boss_extrude3_end, keep=Keep.BOTH, mode=Mode.PRIVATE)
    add(boss_extrude3_tool1.solids().sort_by(Axis((-26.258579, 6.5, -21.4), (0, -1, 0)))[0])
    add(boss_extrude3_tool2.solids().sort_by(Axis((16.541421, 6.5, -21.4), (0, -1, 0)))[0])
    add(boss_extrude3_tool3.solids().sort_by(Axis((16.541421, 6.5, 21.4), (0, -1, 0)))[0])
    add(boss_extrude3_tool4.solids().sort_by(Axis((-26.258579, 6.5, 21.4), (0, -1, 0)))[0])

    # Sketch6 → Cut-Extrude1 (cut)
    with BuildSketch(Plane(origin=(0, 6.5, 0), x_dir=(1, 0, 0), z_dir=(0, 1, 0))):
        with Locations(Location((-21.4, 21.4, 0), (0, 0, 270))):
            Circle(SKETCH6_R)
        with Locations(Location((21.4, 21.4, 0), (0, 0, 270))):
            Circle(SKETCH6_R)
        with Locations(Location((-21.4, -21.4, 0), (0, 0, 270))):
            Circle(SKETCH6_R)
        with Locations(Location((21.4, -21.4, 0), (0, 0, 270))):
            Circle(SKETCH6_R)
    extrude(amount=-CUT_EXTRUDE1_DEPTH, mode=Mode.SUBTRACT)

    # Sketch7 → Boss-Extrude4 (add)
    with BuildSketch(Plane(origin=(0, 6.5, 0), x_dir=(1, 0, 0), z_dir=(0, 1, 0))):
        with BuildLine():
            Line((16.5, 25.4), (16.5, 40))
            Line((16.5, 40), (28.5, 40))
            Line((28.5, 40), (28.5, 32.25))
            Line((28.5, 32.25), (25.4, 24.4))
            ThreePointArc((25.4, 24.4), (22.107106781, 26.349747468), (18.4, 25.4))
            Line((18.4, 25.4), (16.5, 25.4))
        make_face()
        with Locations(Location((22.5, 35, 0), (0, 0, 270))):
            Circle(SKETCH7_R, mode=Mode.SUBTRACT)
    boss_extrude4 = extrude(amount=-BOSS_EXTRUDE4_DEPTH)

    # Sketch8 → Cut-Extrude2 (cut)
    with BuildSketch(Plane(origin=(0, 6.5, 0), x_dir=(1, 0, 0), z_dir=(0, 1, 0))):
        with Locations(Location((22.5, 35, 0), (0, 0, 270))):
            Circle(SKETCH8_R)
    cut_extrude2 = extrude(amount=-CUT_EXTRUDE2_DEPTH, mode=Mode.SUBTRACT)

    # Mirror1: Boss-Extrude4, Cut-Extrude2 across plane
    add(boss_extrude4.mirror(Plane(origin=(0, 0, 0), x_dir=(0, 0, 1), z_dir=(1, 0, 0))))
    add(cut_extrude2.mirror(Plane(origin=(0, 0, 0), x_dir=(0, 0, 1), z_dir=(1, 0, 0))), mode=Mode.SUBTRACT)

    # Fillet3
    fillet3_edges = [part.edges().sort_by_distance(p)[0] for p in [
        (16.5, 3.25, -25.4),
        (-16.5, 3.25, -25.4),
    ]]
    fillet(fillet3_edges, radius=FILLET3_R)

    # Sketch9 → Boss-Extrude5 (add)
    with BuildSketch(Plane(origin=(0, 6.5, 0), x_dir=(1, 0, 0), z_dir=(0, 1, 0))):
        with BuildLine():
            Line((-24.25, -25.50822346), (-24.25, -36.962430679))
            ThreePointArc((-24.25, -36.962430679), (-19.755484827, -37.480943602), (-15.25, -37.893410284))
            Line((-15.25, -37.893410284), (-15.25, -25.4))
            Line((-15.25, -25.4), (-18.4, -25.4))
            ThreePointArc((-18.4, -25.4), (-21.30751714, -26.399144619), (-24.25, -25.50822346))
        make_face()
    boss_extrude5 = extrude(amount=-BOSS_EXTRUDE5_DEPTH)

    # Sketch10 → Cut-Extrude3 (cut)
    with BuildSketch(Plane(origin=(0, 6.5, 0), x_dir=(1, 0, 0), z_dir=(0, 1, 0))):
        with Locations(Location((-19.75, -32.06, 0), (0, 0, 270))):
            Circle(SKETCH10_R)
    cut_extrude3 = extrude(amount=-CUT_EXTRUDE3_DEPTH, mode=Mode.SUBTRACT)

    # Sketch11 → Cut-Extrude4 (cut, through all)
    with BuildSketch(Plane(origin=(0, 2.5, 0), x_dir=(1, 0, 0), z_dir=(0, 1, 0))):
        with Locations(Location((-19.75, -32.06, 0), (0, 0, 270))):
            Circle(SKETCH11_R)
    cut_extrude4 = extrude(amount=-CUT_EXTRUDE4_DEPTH, mode=Mode.SUBTRACT)

    # Mirror2: Boss-Extrude5, Cut-Extrude3, Cut-Extrude4 across plane
    add(boss_extrude5.mirror(Plane(origin=(0, 0, 0), x_dir=(0, 0, 1), z_dir=(1, 0, 0))))
    add(cut_extrude3.mirror(Plane(origin=(0, 0, 0), x_dir=(0, 0, 1), z_dir=(1, 0, 0))), mode=Mode.SUBTRACT)
    add(cut_extrude4.mirror(Plane(origin=(0, 0, 0), x_dir=(0, 0, 1), z_dir=(1, 0, 0))), mode=Mode.SUBTRACT)

    # Fillet4
    fillet4_edges = [part.edges().sort_by_distance(p)[0] for p in [
        (-24.25, 3.25, 25.50822346),
        (-15.25, 3.25, 25.4),
        (15.25, 3.25, 25.4),
        (24.25, 3.25, 25.50822346),
    ]]
    fillet(fillet4_edges, radius=FILLET4_R)


solid = part.part
